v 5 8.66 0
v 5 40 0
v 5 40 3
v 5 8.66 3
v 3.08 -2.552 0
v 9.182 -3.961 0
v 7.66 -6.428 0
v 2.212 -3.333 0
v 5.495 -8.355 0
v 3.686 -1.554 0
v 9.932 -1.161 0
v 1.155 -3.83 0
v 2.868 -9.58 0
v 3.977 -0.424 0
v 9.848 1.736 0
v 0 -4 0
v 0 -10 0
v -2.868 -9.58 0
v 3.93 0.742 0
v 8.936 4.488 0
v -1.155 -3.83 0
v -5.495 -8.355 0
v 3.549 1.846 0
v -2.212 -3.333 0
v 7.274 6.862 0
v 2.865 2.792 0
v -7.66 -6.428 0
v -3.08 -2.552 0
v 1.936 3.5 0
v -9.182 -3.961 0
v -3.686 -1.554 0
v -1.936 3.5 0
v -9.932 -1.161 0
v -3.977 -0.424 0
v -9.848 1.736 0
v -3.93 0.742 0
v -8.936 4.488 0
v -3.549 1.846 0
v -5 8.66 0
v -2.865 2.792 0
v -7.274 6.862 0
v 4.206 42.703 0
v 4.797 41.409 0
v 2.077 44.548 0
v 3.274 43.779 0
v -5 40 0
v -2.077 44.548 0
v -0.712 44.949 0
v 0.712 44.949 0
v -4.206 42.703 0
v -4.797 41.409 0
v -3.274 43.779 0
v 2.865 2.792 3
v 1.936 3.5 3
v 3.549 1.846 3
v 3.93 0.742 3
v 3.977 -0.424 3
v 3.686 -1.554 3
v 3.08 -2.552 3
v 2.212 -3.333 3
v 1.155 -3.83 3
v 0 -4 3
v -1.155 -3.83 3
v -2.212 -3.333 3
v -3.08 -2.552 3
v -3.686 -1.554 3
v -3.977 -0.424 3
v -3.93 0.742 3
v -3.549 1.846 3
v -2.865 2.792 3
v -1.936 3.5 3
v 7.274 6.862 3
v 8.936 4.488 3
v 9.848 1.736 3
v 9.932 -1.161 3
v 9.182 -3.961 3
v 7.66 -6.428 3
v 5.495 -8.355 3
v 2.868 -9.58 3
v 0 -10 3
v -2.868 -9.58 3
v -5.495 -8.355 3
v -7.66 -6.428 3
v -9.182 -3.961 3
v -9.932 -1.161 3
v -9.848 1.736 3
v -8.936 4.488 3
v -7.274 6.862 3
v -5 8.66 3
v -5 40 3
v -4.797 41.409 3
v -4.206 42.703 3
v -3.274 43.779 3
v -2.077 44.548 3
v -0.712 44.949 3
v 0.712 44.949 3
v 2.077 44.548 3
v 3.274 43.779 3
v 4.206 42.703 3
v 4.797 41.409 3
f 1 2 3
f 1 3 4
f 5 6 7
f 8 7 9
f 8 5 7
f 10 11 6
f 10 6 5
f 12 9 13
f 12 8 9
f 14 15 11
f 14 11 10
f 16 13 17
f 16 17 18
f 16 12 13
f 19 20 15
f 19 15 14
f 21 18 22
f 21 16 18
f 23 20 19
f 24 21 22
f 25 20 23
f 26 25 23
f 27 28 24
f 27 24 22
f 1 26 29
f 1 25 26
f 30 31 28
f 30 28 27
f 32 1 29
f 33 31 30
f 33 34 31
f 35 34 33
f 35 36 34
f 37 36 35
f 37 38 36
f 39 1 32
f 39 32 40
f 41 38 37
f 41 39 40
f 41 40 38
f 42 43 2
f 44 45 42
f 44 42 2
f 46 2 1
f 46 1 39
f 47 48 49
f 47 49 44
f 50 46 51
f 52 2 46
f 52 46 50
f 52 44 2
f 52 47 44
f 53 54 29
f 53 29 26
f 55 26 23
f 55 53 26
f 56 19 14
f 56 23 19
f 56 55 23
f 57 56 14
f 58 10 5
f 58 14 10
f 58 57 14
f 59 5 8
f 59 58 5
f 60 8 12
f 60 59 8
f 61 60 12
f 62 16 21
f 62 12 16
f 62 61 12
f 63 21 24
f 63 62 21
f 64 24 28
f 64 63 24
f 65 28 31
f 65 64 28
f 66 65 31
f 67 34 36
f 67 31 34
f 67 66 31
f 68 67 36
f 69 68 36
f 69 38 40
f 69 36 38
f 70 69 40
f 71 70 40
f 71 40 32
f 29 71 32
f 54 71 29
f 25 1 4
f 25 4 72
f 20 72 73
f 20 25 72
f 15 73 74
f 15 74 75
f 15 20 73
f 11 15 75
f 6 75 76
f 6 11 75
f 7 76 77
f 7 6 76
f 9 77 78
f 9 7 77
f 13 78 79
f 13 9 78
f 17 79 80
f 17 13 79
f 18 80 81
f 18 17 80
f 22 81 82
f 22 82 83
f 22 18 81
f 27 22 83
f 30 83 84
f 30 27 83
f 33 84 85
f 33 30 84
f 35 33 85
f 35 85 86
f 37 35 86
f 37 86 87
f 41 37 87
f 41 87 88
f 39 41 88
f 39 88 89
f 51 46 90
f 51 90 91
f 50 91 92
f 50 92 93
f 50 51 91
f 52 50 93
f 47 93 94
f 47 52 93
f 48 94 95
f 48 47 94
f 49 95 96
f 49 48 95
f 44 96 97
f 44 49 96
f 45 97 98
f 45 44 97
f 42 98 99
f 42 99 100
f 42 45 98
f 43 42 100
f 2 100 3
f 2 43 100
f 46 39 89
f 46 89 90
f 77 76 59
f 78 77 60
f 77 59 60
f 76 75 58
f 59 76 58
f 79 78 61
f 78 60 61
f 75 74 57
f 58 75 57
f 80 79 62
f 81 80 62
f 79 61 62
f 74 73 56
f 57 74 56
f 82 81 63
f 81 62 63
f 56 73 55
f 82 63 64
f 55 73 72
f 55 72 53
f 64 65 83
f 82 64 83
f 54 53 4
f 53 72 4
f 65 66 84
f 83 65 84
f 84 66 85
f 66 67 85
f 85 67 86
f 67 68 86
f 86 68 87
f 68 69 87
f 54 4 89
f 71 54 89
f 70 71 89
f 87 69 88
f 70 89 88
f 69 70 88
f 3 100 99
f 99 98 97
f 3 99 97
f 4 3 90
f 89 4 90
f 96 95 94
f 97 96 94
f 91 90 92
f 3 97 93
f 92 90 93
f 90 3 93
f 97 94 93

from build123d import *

# Parameters (mm, degrees)
EXTRUSION1_DEPTH = 3
EXTRUSION2_DEPTH = 4


with BuildPart() as part:
    # Esquisse1 → Extrusion1 (new body)
    with BuildSketch(Plane.XY):
        with BuildLine():
            Line((-5, 8.660254038), (-5, 40))
            ThreePointArc((-5, 40), (0, 45), (5, 40))
            Line((5, 40), (5, 8.660254038))
            ThreePointArc((5, 8.660254038), (0, -10), (-5, 8.660254038))
        make_face()
    extrude(amount=EXTRUSION1_DEPTH)

    # Esquisse2 → Extrusion2 (cut, through all)
    with BuildSketch(Plane.XY.offset(3)):
        with BuildLine():
            Line((-1.936491673, 3.5), (1.936491673, 3.5))
            ThreePointArc((1.936491673, 3.5), (0, -4), (-1.936491673, 3.5))
        make_face()
    extrude(amount=-EXTRUSION2_DEPTH, mode=Mode.SUBTRACT)


solid = part.part
